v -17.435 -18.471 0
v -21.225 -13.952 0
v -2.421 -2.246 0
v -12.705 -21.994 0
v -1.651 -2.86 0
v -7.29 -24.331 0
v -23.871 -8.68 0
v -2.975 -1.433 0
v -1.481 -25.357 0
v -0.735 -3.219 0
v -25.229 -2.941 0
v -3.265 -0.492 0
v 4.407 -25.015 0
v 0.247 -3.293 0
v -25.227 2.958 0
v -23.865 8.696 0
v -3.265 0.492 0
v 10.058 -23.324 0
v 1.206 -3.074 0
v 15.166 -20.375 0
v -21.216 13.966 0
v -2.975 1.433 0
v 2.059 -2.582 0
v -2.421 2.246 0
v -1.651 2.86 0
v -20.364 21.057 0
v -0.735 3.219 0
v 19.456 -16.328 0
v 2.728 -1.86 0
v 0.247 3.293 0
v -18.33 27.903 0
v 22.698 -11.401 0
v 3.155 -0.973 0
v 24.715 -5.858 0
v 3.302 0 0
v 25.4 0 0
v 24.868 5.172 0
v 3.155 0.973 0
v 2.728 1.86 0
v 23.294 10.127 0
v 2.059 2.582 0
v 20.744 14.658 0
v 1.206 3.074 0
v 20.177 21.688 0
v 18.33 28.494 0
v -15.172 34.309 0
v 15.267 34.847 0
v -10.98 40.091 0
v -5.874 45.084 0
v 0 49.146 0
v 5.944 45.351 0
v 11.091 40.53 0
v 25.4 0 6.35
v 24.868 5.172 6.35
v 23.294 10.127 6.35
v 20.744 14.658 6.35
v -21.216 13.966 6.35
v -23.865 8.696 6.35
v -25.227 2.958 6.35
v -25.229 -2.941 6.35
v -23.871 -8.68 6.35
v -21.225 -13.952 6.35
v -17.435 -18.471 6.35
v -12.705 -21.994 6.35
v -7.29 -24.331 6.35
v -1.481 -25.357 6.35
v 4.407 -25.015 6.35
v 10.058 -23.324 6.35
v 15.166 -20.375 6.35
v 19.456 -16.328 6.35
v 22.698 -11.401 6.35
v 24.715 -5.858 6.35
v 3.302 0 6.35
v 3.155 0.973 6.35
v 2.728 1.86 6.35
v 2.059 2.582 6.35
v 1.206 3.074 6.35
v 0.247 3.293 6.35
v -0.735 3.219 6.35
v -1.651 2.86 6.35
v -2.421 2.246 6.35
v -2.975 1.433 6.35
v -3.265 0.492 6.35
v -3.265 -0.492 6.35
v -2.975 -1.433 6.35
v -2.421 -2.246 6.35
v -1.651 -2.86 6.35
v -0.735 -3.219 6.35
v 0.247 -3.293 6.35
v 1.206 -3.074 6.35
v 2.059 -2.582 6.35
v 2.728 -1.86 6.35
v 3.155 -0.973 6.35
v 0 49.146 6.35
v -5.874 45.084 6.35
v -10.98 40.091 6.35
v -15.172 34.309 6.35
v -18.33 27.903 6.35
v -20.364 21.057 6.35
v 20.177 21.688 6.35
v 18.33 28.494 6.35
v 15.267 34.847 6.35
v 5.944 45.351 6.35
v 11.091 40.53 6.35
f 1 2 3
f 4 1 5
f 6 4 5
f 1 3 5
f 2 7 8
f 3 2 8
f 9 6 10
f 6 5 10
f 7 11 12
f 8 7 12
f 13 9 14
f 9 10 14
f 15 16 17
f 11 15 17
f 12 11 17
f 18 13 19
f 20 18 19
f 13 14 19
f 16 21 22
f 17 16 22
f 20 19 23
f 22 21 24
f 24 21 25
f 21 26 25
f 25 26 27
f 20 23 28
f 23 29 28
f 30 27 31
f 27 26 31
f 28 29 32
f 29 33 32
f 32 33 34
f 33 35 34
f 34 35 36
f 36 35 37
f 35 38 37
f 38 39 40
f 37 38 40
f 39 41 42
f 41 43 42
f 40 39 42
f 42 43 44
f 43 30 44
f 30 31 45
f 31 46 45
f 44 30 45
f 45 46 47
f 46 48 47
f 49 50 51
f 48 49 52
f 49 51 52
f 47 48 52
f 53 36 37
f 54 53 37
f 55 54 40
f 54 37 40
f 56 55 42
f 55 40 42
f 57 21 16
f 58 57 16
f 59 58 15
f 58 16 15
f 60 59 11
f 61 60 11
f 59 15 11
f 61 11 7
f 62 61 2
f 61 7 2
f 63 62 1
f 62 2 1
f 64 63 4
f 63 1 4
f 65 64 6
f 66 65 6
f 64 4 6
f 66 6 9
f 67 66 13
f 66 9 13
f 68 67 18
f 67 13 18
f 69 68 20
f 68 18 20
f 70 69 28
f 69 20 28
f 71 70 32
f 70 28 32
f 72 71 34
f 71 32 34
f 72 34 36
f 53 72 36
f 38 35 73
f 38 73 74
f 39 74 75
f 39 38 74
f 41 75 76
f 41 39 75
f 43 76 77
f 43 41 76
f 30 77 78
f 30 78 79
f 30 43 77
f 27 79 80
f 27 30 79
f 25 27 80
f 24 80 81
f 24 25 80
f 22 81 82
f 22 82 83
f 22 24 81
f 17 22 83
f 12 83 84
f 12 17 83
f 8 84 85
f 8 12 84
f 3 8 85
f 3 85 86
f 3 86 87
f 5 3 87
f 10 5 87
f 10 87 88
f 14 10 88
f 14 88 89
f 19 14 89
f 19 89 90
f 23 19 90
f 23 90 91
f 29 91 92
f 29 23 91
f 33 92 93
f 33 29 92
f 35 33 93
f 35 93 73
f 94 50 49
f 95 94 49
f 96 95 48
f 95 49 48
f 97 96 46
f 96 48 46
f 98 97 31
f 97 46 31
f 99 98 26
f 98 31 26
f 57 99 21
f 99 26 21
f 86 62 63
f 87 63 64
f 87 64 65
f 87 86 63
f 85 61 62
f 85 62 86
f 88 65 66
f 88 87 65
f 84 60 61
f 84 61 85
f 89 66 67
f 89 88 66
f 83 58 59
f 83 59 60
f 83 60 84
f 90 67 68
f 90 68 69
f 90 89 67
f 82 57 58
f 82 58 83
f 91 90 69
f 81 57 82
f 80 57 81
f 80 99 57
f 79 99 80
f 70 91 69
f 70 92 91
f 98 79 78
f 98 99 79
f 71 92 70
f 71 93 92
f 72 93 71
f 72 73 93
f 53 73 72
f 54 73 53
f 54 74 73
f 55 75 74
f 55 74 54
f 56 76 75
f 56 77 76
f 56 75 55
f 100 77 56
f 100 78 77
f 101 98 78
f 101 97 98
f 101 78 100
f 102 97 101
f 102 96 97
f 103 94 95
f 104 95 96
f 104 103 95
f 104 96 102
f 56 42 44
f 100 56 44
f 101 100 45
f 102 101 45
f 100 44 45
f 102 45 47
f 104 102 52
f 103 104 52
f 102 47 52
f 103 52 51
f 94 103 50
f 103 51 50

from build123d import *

# Parameters (mm, degrees)
F0_R     = 3.302
F1_DEPTH = 6.35


with BuildPart() as f1:
    # F0 (on Top) → F1 (new body)
    with BuildSketch(Plane.XY):
        with BuildLine():
            ThreePointArc((-21.215855, 13.965941), (-7.289626, -24.331489), (25.4, 0))
            ThreePointArc((25.4, 0), (24.207914, 7.690052), (20.743551, 14.658278))
            ThreePointArc((20.743551, 14.658278), (-0.419047, 25.396543), (-21.215855, 13.965941))
        make_face()
        Circle(F0_R, mode=Mode.SUBTRACT)
        with BuildLine():
            ThreePointArc((-21.215855, 13.965941), (-0.419047, 25.396543), (20.743551, 14.658278))
            ThreePointArc((20.743551, 14.658278), (15.267392, 34.846937), (0, 49.146485))
            ThreePointArc((0, 49.146485), (-15.17191, 34.308552), (-21.215855, 13.965941))
        make_face()
    extrude(amount=F1_DEPTH)


solid = f1.part
